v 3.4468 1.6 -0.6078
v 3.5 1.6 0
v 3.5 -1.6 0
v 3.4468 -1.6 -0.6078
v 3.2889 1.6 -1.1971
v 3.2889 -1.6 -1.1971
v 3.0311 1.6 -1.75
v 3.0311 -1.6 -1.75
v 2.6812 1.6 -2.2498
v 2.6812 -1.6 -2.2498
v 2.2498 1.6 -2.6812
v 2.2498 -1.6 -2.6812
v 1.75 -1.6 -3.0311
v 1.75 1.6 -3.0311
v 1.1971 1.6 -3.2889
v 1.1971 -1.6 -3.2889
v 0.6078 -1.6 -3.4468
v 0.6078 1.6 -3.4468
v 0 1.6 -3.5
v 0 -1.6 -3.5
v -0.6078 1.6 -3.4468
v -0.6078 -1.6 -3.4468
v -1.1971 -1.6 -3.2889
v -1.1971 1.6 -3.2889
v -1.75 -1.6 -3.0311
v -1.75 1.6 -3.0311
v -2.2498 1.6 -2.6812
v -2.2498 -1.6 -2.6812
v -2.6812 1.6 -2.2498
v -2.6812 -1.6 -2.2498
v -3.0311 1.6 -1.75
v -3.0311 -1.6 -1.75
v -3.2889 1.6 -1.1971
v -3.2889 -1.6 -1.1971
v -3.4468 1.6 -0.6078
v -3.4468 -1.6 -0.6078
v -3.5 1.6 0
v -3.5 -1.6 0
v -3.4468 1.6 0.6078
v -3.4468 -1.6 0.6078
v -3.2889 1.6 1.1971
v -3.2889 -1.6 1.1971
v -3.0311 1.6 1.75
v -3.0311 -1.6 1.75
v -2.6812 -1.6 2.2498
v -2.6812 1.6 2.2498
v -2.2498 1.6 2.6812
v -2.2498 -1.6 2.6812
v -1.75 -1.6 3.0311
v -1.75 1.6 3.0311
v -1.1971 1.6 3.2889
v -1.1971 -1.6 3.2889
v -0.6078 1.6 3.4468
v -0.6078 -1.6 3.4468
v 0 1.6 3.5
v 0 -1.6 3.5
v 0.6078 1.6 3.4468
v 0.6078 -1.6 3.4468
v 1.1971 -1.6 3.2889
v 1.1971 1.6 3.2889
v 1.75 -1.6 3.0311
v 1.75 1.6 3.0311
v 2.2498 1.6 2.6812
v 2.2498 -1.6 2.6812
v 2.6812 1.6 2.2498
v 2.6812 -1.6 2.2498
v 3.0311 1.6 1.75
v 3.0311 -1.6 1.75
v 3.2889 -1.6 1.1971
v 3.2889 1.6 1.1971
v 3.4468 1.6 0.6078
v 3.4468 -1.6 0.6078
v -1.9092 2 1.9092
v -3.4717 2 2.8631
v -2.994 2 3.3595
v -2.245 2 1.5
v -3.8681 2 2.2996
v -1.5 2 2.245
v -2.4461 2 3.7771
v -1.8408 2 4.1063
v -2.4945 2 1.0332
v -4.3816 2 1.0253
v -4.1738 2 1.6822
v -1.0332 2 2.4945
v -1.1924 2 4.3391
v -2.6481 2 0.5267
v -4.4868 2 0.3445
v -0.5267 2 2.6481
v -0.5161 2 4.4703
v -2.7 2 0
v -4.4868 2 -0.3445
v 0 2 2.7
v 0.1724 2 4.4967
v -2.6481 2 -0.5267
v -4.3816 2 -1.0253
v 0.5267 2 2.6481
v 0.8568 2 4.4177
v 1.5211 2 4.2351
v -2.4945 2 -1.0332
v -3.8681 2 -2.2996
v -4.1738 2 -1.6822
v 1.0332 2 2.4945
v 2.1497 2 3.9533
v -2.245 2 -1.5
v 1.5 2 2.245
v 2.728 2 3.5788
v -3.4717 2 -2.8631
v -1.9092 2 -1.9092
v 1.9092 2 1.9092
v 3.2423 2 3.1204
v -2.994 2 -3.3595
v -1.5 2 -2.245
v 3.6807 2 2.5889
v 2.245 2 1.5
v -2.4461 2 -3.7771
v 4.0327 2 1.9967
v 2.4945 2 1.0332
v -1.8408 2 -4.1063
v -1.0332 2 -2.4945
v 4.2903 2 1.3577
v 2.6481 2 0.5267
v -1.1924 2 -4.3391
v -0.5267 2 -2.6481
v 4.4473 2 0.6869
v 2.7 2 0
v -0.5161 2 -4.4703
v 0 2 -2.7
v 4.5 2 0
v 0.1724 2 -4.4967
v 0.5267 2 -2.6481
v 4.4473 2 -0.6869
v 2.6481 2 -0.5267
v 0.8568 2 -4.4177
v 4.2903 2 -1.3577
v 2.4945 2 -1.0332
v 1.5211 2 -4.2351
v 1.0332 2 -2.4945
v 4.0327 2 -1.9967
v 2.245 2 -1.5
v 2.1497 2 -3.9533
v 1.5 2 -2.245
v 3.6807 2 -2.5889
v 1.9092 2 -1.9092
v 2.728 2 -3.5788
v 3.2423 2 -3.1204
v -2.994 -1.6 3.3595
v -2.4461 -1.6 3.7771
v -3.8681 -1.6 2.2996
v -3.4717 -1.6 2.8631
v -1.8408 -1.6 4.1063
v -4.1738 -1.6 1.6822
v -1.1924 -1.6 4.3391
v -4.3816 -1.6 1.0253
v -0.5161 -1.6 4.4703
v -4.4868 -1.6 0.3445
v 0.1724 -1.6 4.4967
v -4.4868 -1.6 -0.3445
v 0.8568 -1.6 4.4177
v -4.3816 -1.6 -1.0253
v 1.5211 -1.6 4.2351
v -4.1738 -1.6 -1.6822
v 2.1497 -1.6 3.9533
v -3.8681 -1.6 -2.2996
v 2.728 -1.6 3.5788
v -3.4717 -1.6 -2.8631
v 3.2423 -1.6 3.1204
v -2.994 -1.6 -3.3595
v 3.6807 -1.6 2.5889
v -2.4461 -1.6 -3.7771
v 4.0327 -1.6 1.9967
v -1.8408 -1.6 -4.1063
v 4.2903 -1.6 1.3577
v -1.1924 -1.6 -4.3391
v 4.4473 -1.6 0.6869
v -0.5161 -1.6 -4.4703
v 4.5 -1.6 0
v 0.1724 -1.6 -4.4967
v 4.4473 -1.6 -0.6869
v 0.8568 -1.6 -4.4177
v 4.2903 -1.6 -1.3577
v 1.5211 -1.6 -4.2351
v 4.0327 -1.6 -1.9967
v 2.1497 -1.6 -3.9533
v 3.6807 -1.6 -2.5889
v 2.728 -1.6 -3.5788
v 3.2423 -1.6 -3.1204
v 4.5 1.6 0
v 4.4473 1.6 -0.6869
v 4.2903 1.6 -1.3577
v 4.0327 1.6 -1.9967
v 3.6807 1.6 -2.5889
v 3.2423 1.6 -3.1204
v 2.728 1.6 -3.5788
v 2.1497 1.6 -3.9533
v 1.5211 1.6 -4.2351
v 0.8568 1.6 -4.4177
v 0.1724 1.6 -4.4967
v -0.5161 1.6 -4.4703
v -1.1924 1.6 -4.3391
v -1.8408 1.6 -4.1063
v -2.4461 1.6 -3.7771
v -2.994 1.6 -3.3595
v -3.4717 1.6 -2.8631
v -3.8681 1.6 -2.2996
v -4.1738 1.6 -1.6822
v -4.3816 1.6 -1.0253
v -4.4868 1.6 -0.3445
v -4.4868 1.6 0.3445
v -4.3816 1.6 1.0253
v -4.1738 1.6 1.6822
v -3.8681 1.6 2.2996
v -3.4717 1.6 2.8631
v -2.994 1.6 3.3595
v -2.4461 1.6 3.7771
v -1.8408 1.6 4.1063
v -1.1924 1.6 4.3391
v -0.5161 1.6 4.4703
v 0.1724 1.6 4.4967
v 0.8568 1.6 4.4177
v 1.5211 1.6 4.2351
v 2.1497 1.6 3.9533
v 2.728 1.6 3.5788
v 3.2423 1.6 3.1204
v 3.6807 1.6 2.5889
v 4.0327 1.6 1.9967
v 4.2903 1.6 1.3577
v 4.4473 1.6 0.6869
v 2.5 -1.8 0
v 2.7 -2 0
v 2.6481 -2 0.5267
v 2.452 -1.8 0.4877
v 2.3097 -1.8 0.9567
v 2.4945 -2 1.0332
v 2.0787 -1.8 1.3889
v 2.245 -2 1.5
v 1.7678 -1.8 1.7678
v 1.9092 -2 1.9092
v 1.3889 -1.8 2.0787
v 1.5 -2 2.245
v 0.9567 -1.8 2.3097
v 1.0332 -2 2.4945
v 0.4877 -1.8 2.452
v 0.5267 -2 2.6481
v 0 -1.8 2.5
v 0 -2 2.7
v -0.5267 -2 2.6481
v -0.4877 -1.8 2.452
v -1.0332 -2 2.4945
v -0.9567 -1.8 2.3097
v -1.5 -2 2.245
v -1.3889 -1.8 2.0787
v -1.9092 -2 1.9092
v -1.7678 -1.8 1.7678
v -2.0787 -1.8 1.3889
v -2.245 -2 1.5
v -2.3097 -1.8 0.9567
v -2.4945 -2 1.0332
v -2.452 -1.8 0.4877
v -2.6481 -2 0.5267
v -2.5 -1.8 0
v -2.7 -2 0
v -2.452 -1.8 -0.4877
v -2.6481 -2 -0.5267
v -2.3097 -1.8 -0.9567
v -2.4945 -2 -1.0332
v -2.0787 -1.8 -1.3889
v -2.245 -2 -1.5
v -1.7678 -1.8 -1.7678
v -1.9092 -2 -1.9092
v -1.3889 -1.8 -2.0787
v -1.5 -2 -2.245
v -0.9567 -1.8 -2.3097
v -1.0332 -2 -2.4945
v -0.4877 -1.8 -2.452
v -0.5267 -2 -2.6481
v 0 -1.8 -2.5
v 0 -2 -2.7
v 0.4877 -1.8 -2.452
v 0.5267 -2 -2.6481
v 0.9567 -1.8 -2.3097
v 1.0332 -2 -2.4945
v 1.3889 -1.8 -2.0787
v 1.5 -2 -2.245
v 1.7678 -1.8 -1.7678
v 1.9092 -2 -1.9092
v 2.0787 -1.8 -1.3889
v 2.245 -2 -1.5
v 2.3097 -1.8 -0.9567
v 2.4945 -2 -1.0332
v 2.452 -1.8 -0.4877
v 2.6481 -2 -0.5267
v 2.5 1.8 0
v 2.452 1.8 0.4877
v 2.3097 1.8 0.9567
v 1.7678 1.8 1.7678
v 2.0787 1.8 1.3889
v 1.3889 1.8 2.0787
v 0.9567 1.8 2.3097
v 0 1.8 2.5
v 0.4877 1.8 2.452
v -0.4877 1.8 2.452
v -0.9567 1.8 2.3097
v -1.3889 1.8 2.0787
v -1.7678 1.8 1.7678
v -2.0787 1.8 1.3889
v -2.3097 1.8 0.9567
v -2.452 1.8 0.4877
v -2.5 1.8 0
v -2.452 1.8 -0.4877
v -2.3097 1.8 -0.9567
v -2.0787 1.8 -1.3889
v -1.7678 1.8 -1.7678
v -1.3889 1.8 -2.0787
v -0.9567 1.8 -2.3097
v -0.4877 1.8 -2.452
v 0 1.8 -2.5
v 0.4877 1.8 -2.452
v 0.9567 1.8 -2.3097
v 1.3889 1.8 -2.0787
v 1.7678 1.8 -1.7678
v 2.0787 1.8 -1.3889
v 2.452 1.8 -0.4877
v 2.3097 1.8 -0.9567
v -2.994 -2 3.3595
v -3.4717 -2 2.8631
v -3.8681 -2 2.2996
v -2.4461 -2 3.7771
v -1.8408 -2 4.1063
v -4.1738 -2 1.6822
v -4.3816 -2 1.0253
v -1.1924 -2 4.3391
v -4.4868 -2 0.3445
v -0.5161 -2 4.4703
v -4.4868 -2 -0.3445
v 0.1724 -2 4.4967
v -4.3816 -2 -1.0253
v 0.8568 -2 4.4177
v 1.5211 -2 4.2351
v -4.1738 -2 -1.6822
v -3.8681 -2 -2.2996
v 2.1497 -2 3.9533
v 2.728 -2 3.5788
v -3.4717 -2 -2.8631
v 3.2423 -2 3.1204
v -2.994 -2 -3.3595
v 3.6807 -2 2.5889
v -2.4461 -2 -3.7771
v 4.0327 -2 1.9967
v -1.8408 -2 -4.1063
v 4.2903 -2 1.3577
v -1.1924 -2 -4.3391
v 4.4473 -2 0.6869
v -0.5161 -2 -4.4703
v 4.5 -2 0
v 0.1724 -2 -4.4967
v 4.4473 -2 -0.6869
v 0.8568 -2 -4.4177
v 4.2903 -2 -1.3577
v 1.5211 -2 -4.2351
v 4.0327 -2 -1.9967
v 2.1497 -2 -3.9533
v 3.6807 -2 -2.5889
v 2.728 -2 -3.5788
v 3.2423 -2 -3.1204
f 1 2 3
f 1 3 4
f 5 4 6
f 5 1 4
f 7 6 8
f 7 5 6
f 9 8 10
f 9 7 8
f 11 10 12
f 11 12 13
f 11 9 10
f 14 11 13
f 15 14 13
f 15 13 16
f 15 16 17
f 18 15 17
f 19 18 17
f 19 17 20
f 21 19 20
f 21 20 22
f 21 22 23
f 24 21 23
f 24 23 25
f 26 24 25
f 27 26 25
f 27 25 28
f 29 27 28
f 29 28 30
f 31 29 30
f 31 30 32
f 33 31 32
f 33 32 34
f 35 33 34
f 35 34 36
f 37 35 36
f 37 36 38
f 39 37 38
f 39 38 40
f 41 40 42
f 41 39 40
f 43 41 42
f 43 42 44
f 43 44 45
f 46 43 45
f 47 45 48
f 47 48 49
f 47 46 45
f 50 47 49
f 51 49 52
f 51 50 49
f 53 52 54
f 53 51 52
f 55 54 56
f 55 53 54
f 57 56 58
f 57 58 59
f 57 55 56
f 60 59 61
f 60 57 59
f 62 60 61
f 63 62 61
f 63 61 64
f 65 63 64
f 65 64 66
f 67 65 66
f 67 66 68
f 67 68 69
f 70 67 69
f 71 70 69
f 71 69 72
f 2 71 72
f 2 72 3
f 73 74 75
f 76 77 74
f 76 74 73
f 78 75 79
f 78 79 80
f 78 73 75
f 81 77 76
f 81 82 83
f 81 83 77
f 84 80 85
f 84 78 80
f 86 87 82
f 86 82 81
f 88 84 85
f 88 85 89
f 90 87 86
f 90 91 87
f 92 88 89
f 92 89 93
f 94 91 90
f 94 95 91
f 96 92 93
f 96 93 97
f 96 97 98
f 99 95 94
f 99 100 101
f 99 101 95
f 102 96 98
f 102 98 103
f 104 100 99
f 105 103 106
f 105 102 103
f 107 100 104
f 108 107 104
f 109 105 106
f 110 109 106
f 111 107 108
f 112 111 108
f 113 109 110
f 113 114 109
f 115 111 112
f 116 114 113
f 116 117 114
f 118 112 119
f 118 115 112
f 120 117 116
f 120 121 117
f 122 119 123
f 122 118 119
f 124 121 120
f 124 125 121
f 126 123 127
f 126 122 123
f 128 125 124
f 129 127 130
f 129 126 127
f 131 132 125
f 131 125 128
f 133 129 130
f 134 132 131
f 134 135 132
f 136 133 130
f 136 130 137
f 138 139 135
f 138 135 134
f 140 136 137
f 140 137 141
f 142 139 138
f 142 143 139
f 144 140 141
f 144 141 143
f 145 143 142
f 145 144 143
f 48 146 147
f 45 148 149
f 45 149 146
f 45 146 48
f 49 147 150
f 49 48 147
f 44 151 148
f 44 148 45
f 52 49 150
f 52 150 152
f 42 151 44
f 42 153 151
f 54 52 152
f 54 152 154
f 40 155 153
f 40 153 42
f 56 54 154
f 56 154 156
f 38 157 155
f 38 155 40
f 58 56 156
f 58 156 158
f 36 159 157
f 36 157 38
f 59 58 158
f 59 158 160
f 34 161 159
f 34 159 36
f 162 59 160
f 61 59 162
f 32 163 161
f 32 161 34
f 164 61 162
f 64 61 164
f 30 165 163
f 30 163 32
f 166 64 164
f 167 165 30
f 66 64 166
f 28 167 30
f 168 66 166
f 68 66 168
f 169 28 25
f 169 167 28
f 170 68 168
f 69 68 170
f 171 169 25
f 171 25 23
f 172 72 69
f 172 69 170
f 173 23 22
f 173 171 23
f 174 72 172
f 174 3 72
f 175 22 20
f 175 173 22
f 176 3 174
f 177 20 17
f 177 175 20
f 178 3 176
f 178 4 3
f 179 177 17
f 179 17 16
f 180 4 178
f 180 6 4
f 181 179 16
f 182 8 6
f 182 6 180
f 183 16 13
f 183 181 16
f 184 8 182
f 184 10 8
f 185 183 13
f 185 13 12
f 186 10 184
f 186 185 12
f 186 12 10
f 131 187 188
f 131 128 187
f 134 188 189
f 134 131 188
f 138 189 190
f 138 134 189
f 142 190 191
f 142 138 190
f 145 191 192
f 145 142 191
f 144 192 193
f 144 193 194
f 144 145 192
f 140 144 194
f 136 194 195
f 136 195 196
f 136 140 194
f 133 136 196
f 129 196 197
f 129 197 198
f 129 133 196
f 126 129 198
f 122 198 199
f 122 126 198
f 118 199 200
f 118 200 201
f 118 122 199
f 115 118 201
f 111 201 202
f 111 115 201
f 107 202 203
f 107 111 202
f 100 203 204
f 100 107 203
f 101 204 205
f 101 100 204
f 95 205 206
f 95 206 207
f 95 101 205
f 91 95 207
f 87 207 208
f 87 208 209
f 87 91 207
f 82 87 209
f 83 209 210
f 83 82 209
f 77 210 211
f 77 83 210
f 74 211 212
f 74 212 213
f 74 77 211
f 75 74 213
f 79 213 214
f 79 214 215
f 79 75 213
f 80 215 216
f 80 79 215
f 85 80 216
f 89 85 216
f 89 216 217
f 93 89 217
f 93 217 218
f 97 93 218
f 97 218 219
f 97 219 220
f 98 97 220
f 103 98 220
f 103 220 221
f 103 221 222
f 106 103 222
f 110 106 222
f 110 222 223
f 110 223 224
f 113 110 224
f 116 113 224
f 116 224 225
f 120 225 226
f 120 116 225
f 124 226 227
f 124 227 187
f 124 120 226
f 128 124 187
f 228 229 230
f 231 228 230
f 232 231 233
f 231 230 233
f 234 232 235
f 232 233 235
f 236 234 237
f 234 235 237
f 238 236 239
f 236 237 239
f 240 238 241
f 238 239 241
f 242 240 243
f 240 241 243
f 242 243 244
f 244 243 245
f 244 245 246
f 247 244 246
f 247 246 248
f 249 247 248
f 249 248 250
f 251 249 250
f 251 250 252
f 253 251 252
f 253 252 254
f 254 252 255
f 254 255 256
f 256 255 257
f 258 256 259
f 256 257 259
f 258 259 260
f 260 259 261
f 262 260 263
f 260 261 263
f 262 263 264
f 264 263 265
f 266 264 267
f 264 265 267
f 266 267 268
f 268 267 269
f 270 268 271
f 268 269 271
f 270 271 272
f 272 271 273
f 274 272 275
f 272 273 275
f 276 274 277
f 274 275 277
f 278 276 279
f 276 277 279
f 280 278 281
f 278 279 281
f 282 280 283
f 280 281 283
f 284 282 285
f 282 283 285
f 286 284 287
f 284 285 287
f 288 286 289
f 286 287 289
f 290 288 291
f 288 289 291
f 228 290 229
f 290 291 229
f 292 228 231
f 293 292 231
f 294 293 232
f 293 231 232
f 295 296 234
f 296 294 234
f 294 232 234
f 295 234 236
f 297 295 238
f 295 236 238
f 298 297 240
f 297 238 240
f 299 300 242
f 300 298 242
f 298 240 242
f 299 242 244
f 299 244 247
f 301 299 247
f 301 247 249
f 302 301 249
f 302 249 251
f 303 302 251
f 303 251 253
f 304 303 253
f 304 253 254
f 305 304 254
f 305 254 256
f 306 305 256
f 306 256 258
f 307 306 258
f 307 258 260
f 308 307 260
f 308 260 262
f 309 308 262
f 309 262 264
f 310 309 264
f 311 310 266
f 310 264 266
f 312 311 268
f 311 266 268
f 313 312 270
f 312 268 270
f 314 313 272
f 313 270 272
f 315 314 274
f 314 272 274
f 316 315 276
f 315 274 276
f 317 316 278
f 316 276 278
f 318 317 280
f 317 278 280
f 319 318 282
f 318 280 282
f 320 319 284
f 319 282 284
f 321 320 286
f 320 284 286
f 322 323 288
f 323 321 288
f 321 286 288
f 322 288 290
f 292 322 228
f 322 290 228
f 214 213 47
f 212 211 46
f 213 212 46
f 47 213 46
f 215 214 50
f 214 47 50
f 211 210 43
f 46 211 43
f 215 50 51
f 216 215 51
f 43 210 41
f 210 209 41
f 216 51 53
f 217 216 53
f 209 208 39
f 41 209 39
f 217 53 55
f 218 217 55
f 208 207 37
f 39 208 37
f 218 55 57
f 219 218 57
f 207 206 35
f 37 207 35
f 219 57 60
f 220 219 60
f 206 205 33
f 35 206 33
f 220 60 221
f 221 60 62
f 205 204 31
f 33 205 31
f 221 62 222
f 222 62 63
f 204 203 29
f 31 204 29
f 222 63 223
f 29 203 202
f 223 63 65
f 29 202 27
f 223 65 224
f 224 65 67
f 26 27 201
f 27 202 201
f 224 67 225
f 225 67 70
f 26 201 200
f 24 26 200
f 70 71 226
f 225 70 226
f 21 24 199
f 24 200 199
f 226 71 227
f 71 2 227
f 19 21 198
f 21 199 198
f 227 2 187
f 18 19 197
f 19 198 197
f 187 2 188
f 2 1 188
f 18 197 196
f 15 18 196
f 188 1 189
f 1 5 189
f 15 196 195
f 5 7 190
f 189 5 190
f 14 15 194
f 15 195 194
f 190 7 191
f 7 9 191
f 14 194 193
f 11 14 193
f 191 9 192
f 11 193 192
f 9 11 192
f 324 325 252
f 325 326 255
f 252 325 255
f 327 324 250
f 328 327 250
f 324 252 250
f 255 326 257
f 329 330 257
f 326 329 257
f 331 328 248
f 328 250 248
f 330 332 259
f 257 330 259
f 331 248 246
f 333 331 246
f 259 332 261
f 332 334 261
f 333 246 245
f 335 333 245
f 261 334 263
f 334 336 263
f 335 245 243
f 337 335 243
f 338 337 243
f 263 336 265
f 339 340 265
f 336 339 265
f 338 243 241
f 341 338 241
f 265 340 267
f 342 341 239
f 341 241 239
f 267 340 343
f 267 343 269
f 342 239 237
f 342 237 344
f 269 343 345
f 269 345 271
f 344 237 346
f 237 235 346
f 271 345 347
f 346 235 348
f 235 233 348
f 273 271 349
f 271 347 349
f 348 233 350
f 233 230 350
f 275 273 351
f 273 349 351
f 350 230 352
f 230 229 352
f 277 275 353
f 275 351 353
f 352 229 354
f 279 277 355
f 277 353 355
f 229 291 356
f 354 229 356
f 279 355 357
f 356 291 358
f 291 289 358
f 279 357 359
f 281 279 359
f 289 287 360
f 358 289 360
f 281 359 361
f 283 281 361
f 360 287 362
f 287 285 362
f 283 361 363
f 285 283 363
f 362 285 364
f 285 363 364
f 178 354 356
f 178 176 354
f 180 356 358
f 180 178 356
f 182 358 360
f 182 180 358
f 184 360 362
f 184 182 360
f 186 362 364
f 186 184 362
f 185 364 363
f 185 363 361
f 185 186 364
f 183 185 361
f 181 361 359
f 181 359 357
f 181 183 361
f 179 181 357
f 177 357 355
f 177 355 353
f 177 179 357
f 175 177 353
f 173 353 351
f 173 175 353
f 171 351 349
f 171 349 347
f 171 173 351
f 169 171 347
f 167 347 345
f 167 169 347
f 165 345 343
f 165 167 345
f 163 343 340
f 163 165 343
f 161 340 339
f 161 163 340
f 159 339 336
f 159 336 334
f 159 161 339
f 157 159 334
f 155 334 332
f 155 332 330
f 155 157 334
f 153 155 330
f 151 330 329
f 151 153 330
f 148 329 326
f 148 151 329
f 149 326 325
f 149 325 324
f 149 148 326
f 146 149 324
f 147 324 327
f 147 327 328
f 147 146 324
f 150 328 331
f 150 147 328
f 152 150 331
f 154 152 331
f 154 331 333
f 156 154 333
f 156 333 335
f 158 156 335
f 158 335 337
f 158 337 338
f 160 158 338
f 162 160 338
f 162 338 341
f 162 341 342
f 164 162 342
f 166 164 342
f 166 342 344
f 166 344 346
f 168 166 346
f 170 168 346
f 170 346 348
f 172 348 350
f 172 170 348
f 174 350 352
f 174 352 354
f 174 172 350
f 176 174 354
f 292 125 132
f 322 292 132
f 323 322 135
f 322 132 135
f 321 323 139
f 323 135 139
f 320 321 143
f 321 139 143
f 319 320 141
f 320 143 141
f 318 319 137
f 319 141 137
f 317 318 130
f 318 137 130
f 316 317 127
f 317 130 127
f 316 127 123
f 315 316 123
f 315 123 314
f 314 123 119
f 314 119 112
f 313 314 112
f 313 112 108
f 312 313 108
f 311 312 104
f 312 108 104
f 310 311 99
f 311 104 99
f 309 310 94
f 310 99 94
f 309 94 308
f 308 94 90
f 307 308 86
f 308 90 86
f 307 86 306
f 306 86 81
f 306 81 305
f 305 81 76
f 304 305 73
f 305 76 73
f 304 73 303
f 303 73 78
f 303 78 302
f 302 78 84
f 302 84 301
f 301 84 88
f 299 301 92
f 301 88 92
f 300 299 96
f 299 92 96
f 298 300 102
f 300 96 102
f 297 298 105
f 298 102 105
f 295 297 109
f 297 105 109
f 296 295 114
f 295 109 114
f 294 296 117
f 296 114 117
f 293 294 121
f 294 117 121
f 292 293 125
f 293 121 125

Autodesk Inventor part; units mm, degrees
ref_plane "YZ Plane" through (0, 0, 0) normal (1, 0, 0) x (0, 1, 0)
ref_plane "XZ Plane" through (0, 0, 0) normal (0, 1, 0) x (-1, 0, 0)
ref_plane "XY Plane" through (0, 0, 0) normal (0, 0, 1) x (1, 0, 0)
sketch "Skizze1" plane through (0, 0, 0) normal (0, 0, 1) x (1, 0, 0)
  line L0 (0, -2) -> (0, 2)
  line L1 (2.5, 2) -> (2.5, -2)
  line L2 (4.5, -2) -> (4.5, -1.6)
  line L3 (4.5, -1.6) -> (3.5, -1.6)
  line L4 (3.5, -1.6) -> (3.5, 1.6)
  line L5 (3.5, 1.6) -> (4.5, 1.6)
  line L6 (4.5, 1.6) -> (4.5, 2)
  line L7 (-0.9, 0) -> (5.4, 0) projected
  line L8 (4.5, -2) -> (2.5, -2)
  line L9 (4.5, 2) -> (2.5, 2)
  point P0 (0, 0)
  point P1 (0, 0)
  dimension "d0" = 5
  dimension "d3" = 7
  dimension "d4" = 1
  dimension "d6" = 4
  dimension "d8" = 3.2
revolve "Umdrehung1" add sketch "Skizze1" angle 360 about axis through (0, -2, 0) along (0, 1, 0)
chamfer "Fase2" distance 0.2 angle 45 2 edges at (-2.5, 2, 0) (-2.5, -2, 0)
properties part number "Rolle" material "Aluminium 6061"
